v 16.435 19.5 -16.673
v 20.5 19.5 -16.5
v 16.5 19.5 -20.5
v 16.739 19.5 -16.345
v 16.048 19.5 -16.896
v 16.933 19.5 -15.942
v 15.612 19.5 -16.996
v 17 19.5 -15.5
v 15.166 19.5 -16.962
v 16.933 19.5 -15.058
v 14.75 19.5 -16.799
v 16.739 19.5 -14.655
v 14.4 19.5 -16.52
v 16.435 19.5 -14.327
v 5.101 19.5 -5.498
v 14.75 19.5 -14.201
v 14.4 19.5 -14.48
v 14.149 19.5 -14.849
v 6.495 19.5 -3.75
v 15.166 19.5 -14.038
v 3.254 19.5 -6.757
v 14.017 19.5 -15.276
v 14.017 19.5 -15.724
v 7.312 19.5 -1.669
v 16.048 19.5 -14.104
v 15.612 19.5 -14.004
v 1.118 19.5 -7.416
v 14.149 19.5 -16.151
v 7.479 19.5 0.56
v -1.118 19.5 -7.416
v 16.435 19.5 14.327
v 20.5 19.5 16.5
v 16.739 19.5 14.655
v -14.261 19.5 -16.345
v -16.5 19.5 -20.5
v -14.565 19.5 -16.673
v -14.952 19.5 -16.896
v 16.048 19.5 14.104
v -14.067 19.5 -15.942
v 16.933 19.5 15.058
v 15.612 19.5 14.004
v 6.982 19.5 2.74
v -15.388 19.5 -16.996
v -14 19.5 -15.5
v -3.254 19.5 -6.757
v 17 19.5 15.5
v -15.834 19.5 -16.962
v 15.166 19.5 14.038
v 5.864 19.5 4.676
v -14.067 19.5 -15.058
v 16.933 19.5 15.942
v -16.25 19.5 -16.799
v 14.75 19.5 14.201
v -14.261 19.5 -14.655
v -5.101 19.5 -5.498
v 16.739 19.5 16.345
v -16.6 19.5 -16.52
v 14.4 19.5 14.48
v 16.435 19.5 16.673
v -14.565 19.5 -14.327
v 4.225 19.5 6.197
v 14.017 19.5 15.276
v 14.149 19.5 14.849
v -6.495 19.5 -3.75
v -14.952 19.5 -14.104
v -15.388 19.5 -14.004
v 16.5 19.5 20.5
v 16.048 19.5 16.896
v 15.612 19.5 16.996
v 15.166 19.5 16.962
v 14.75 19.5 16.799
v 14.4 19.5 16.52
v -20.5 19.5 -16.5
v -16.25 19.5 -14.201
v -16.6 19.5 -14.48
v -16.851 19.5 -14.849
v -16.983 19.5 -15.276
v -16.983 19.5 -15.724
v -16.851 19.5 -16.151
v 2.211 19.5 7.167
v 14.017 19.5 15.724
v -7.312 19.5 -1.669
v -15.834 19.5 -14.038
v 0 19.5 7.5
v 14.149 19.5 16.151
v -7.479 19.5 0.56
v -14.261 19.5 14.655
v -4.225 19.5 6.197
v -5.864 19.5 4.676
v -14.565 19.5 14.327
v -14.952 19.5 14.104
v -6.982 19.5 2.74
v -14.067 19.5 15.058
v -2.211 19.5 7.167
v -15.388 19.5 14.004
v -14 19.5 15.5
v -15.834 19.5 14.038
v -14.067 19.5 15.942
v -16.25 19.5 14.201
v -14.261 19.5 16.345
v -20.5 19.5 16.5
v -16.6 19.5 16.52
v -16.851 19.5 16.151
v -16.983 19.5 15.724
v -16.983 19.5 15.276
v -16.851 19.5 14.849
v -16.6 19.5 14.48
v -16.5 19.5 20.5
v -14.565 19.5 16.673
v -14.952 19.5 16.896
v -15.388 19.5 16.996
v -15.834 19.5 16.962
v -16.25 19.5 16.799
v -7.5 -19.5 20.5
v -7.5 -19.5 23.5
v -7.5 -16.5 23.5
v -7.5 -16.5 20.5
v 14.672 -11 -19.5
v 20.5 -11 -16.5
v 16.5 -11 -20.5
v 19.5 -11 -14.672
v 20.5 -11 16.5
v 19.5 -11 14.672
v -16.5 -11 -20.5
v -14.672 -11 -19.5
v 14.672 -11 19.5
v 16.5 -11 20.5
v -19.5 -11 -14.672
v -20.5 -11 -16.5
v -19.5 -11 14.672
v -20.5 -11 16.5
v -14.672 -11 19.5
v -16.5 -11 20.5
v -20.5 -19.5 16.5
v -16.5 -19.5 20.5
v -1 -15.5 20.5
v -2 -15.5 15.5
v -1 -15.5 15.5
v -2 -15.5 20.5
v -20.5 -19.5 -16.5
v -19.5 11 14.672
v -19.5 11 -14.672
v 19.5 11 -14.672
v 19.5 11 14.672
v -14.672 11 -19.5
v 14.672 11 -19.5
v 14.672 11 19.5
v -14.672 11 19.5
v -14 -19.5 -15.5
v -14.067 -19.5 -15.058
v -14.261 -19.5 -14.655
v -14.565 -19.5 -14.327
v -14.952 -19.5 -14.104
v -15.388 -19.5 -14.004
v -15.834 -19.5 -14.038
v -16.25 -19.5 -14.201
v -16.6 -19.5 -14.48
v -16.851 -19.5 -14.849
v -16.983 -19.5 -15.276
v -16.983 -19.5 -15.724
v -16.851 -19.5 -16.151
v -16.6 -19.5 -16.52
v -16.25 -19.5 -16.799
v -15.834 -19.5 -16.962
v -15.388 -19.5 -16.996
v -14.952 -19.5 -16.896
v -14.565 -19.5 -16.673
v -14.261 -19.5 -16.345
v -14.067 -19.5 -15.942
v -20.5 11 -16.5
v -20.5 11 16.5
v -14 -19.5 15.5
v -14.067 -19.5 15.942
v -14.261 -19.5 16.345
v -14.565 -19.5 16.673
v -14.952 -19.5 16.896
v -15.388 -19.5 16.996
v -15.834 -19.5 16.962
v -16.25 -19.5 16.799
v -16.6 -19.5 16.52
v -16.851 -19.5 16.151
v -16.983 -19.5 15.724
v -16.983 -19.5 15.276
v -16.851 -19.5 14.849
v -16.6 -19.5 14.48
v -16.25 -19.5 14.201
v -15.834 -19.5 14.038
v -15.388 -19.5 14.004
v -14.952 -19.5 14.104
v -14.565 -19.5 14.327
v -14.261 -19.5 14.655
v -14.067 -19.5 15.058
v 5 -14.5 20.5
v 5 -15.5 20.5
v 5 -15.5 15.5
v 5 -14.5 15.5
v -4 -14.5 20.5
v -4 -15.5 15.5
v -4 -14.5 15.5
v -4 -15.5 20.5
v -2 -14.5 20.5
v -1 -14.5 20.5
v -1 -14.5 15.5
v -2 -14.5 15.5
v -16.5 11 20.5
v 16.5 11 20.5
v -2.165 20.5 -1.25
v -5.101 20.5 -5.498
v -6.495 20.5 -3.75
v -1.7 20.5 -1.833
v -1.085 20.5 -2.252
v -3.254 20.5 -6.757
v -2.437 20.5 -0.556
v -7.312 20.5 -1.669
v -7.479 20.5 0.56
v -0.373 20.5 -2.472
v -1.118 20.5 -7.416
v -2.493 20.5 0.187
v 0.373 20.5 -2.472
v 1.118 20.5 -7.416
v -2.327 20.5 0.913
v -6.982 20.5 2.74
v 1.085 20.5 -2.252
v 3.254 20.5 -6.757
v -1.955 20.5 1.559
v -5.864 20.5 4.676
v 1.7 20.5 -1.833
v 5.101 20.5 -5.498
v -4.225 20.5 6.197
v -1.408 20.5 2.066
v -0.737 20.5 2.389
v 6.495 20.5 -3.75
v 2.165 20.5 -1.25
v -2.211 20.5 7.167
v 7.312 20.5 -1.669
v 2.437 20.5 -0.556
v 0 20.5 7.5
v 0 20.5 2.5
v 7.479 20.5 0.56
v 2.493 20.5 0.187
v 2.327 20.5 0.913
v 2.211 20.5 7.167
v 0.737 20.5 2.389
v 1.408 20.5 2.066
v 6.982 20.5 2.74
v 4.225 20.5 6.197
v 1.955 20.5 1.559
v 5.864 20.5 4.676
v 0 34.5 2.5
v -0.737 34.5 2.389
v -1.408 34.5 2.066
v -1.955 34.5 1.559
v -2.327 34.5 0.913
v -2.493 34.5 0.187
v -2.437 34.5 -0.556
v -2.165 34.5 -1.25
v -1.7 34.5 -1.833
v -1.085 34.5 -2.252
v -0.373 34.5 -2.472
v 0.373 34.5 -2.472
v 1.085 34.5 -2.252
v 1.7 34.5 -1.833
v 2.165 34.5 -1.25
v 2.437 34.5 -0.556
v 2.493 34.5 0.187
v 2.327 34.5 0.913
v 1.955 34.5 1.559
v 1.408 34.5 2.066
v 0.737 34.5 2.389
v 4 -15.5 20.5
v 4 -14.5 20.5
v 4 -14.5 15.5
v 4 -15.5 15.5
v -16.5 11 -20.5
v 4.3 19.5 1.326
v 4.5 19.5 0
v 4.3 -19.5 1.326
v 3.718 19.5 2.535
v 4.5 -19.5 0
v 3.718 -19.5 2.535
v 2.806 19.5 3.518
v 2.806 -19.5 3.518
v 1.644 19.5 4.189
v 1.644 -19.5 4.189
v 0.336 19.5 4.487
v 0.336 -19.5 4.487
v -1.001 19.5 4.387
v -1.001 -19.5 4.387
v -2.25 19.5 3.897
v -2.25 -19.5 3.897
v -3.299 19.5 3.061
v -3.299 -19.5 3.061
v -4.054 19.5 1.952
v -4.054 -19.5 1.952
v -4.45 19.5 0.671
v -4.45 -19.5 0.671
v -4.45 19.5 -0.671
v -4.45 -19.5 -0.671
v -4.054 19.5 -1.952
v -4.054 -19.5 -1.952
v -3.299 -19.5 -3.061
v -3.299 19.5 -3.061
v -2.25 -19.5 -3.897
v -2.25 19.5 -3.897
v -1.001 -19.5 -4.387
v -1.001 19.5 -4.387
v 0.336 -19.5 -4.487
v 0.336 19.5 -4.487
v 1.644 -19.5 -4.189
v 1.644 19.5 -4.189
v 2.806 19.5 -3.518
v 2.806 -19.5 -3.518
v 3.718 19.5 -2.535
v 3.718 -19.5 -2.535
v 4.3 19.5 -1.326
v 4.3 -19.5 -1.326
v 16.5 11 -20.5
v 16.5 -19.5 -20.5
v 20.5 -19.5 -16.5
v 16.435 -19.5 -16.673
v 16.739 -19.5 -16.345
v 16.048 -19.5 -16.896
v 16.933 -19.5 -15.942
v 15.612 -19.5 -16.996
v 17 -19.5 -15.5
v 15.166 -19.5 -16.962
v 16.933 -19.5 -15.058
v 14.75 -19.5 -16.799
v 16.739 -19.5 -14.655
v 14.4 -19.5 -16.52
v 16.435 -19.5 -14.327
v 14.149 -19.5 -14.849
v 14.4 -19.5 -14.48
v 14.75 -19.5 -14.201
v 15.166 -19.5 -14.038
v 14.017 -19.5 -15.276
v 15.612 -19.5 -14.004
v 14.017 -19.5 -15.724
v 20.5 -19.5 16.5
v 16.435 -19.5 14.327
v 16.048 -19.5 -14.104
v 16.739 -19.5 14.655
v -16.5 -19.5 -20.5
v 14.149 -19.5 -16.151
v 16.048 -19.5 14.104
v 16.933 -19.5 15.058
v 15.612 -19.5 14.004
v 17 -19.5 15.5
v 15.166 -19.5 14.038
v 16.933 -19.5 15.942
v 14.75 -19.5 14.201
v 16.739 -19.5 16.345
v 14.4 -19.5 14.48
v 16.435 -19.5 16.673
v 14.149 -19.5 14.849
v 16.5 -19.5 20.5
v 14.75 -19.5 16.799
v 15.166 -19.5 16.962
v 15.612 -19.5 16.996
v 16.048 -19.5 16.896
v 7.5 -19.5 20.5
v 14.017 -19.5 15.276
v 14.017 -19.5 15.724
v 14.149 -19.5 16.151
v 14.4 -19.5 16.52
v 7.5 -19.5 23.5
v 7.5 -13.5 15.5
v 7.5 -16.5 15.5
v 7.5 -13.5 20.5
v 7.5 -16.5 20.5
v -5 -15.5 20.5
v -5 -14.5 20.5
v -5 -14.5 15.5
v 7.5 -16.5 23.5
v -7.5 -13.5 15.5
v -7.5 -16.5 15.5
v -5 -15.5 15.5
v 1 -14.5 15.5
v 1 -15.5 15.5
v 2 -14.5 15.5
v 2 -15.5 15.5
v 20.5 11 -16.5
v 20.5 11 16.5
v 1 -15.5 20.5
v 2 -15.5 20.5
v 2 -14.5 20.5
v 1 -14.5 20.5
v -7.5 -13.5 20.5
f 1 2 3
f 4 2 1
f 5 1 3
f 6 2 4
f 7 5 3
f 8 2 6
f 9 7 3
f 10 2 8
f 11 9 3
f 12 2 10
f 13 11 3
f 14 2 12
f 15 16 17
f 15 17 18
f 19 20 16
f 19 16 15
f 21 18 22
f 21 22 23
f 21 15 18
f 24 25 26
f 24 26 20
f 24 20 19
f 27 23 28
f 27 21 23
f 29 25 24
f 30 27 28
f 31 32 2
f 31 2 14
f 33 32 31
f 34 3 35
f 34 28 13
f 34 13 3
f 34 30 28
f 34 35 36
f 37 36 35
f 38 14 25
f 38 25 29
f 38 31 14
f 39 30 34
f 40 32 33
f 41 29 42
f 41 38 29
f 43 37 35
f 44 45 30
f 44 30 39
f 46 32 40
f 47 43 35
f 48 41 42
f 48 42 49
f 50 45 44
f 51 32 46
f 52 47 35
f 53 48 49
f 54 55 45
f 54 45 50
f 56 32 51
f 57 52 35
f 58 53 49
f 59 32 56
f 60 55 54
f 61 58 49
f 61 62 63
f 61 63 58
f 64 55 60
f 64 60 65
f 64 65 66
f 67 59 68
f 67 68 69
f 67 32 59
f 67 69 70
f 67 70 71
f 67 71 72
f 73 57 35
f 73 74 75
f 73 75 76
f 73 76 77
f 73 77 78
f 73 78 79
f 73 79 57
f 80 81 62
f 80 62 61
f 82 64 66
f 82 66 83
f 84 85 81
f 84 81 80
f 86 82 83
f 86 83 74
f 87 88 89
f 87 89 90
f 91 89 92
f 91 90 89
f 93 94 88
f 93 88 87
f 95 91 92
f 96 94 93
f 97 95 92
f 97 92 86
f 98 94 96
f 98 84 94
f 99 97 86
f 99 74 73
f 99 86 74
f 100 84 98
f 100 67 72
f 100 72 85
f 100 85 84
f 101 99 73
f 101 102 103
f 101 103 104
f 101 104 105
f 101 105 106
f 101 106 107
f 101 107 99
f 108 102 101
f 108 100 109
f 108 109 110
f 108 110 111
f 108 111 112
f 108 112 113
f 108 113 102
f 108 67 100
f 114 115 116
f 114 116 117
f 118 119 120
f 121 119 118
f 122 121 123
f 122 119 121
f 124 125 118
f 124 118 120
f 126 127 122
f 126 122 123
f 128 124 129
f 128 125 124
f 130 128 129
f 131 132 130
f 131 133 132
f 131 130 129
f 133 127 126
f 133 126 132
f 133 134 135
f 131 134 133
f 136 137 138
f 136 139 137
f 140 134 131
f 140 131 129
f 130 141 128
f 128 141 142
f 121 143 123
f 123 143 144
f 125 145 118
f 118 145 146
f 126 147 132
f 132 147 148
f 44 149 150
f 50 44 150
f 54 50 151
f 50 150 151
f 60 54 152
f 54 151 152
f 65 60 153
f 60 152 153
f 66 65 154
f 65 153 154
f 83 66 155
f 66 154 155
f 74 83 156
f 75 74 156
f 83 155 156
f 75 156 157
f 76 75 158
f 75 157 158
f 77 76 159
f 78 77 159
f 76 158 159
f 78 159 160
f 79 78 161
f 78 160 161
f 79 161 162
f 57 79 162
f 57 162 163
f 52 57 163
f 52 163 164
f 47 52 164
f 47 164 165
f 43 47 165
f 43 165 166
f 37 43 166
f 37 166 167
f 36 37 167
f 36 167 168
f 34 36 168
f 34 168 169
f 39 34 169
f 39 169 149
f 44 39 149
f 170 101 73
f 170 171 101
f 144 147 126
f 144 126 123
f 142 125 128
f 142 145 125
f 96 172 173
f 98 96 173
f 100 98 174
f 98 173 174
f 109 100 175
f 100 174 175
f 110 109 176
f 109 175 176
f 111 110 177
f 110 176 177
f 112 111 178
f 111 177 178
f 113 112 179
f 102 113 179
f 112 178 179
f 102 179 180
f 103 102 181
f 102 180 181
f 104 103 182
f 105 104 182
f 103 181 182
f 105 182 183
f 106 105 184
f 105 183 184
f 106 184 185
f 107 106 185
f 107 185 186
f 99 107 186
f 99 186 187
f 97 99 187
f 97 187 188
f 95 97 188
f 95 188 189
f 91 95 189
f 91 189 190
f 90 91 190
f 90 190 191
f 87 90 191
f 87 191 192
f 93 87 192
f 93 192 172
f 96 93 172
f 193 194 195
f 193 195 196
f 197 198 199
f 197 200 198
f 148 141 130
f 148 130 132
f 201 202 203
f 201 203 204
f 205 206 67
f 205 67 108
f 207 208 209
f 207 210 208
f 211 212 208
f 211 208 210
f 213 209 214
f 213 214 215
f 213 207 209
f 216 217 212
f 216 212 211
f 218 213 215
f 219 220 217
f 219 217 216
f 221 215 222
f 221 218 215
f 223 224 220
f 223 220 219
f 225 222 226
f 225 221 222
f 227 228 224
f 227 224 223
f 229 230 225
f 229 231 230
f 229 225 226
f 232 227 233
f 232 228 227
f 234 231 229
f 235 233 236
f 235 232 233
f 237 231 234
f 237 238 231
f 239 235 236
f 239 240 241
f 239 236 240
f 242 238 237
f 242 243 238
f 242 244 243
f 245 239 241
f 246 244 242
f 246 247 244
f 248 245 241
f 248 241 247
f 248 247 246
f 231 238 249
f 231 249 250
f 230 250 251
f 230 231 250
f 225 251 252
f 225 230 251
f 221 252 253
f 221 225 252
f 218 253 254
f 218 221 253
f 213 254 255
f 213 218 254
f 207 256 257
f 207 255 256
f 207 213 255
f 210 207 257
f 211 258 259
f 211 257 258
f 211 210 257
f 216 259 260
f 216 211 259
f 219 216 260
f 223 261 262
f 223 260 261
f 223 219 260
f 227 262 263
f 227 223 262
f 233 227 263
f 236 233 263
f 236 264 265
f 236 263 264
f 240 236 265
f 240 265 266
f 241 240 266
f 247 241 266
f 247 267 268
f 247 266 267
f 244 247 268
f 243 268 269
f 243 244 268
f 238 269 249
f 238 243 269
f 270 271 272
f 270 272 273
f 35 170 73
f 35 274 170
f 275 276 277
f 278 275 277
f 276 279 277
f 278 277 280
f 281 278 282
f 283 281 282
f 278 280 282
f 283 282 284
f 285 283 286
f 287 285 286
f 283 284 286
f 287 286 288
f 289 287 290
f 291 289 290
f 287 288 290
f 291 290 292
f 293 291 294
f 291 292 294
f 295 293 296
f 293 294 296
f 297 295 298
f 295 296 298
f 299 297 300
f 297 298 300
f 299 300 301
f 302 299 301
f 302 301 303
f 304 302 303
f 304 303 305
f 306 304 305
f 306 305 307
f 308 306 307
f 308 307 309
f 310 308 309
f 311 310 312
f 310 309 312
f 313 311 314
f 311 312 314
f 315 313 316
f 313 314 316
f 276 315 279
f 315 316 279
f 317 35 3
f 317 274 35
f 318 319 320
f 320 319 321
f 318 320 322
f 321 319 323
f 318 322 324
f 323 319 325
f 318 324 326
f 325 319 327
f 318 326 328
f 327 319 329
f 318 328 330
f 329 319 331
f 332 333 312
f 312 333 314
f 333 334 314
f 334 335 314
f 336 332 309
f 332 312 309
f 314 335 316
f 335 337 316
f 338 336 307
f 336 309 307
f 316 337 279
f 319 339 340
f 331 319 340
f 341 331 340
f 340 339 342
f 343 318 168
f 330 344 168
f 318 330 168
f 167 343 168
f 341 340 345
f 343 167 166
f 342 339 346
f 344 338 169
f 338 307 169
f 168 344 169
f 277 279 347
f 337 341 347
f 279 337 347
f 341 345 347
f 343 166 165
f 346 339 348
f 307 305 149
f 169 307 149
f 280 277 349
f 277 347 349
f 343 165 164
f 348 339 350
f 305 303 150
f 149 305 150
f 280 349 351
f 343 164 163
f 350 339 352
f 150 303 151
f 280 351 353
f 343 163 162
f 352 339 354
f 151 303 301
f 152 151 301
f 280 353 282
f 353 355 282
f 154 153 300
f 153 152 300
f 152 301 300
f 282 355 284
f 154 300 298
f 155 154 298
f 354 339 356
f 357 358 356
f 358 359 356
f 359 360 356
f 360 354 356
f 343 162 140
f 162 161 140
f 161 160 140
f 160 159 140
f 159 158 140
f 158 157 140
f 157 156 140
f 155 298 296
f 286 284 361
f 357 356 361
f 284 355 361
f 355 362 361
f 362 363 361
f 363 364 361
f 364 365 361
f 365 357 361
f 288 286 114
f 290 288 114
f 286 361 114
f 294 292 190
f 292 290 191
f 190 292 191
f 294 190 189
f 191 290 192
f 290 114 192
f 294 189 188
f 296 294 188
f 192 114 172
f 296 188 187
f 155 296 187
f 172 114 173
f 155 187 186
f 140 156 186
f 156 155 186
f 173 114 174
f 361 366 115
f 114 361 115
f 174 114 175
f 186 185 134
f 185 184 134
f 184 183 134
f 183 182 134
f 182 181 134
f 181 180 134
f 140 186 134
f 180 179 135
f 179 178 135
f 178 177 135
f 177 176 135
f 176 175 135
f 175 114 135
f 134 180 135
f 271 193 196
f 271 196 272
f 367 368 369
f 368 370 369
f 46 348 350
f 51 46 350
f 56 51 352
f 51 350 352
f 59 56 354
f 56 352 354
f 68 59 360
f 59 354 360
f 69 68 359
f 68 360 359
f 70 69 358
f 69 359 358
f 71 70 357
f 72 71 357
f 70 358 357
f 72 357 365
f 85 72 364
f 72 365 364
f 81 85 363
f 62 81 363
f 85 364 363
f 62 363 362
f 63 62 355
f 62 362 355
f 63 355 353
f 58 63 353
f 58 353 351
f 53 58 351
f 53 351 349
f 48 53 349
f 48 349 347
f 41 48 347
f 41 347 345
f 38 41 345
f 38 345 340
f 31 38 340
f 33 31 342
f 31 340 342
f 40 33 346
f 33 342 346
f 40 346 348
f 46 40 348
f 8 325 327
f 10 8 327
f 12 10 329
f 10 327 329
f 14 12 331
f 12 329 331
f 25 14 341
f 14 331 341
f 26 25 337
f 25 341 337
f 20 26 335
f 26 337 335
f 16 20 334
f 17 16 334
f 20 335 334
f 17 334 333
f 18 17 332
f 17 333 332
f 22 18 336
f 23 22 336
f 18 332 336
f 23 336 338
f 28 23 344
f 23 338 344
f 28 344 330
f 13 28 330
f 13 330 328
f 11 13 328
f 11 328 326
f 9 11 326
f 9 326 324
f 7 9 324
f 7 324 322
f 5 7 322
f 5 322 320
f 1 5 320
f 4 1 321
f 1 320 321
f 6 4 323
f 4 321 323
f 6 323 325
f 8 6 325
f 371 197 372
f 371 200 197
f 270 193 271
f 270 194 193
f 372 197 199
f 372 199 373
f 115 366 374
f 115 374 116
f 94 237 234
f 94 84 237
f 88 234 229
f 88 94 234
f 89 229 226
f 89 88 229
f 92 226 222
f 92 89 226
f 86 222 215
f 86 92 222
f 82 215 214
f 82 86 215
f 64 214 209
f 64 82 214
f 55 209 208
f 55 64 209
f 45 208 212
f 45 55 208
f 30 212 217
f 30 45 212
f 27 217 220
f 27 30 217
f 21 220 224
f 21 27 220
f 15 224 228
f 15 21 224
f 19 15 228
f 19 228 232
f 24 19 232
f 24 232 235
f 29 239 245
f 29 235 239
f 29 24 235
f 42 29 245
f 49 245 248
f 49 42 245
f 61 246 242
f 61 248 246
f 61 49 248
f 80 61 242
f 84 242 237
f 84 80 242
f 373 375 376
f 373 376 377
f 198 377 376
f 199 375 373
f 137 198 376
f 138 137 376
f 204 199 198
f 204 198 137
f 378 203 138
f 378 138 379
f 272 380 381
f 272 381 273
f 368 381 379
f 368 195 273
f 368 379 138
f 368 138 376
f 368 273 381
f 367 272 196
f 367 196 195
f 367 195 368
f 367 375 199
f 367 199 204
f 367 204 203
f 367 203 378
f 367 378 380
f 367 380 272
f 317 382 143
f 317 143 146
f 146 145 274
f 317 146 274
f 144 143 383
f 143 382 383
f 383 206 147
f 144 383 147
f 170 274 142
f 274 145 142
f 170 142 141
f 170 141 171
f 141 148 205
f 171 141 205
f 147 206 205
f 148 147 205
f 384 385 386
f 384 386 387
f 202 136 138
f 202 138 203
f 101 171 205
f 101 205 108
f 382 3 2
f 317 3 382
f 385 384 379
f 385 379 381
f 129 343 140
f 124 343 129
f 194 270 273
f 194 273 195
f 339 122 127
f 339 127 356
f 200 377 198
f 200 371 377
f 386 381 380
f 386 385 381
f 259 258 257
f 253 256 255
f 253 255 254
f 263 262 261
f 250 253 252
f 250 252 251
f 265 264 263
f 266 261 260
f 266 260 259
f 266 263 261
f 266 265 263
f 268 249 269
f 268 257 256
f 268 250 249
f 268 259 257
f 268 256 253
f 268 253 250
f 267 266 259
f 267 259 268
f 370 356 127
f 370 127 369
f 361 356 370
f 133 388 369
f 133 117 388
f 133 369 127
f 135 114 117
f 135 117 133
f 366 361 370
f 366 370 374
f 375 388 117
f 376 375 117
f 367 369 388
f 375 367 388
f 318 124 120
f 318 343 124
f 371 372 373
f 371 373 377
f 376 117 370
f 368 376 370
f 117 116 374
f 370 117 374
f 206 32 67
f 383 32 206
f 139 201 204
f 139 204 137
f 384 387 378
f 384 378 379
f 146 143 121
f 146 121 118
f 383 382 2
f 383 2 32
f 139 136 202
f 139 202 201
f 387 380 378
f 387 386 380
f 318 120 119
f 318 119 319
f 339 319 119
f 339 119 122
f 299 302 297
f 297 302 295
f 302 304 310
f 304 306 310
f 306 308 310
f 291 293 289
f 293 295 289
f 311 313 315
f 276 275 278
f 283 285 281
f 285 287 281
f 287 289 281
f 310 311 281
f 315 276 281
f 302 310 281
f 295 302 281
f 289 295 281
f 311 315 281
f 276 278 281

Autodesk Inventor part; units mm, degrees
ref_plane "YZ Plane" through (0, 0, 0) normal (1, 0, 0) x (0, 1, 0)
ref_plane "XZ Plane" through (0, 0, 0) normal (0, 1, 0) x (-1, 0, 0)
ref_plane "XY Plane" through (0, 0, 0) normal (0, 0, 1) x (1, 0, 0)
sketch "Skizze1" plane through (0, 0, 0) normal (0, 1, 0) x (-1, 0, 0)
  line L0 (-20.5, 20.5) -> (20.5, 20.5)
  line L1 (20.5, 20.5) -> (20.5, -20.5)
  line L2 (20.5, -20.5) -> (-20.5, -20.5)
  line L3 (-20.5, -20.5) -> (-20.5, 20.5)
  line L4 (-20.5, 20.5) -> (20.5, -20.5) construction
  line L5 (20.5, 20.5) -> (-20.5, -20.5) construction
  point P0 (0, 0)
  dimension "d0" = 41
  dimension "d1" = 41
extrude "Extrusion1" add sketch "Skizze1" along normal mid plane 39
sketch "Skizze2" plane through (0, -19.5, 0) normal (0, -1, 0) x (1, 0, 0)
  line L0 (-20.5, 20.5) -> (20.5, 20.5) projected
  line L1 (-7.5, 20.5) -> (7.5, 20.5)
  line L2 (7.5, 20.5) -> (7.5, 23.5)
  line L3 (7.5, 23.5) -> (-7.5, 23.5)
  line L4 (-7.5, 23.5) -> (-7.5, 20.5)
  line L5 (0, -29.3) -> (0, 32.3) projected
  point P0 (0, 0)
  dimension "d4" = 15
  dimension "d5" = 3
extrude "Extrusion2" add sketch "Skizze2" against normal blind 3
sketch "Skizze3" plane through (0, -19.5, 0) normal (0, -1, 0) x (1, 0, 0)
  line L0 (-15.5, -15.5) -> (15.5, -15.5)
  line L1 (15.5, -15.5) -> (15.5, 15.5)
  line L2 (15.5, 15.5) -> (-15.5, 15.5)
  line L3 (-15.5, 15.5) -> (-15.5, -15.5)
  line L4 (-15.5, -15.5) -> (15.5, 15.5) construction
  line L5 (15.5, -15.5) -> (-15.5, 15.5) construction
  circle A0 centre (-15.5, 15.5) radius 1.5
  circle A1 centre (15.5, 15.5) radius 1.5
  circle A2 centre (15.5, -15.5) radius 1.5
  circle A3 centre (-15.5, -15.5) radius 1.5
  circle A4 centre (0, 0) radius 4.5
  dimension "d8" = 31
  dimension "d9" = 31
  dimension "d10" = 3
  dimension "d11" = 9
extrude "Extrusion3" cut sketch "Skizze3" along normal through all both and the other way through all contours L3 A3 L0 | L0 A3 L3 | A2 L1 L0 | L0 L1 A2 | A0 L2 L3 | L3 L2 A0 | A1 L2 L1 | L1 L2 A1 | A4
chamfer "Fase1" distance 4 angle 45 4 edges at (20.5, 0, 20.5) (-20.5, 0, 20.5) (20.5, 0, -20.5) (-20.5, 0, -20.5)
sketch "Skizze4" plane through (0, 0, 0) normal (0, 1, 0) x (-1, 0, 0)
  line L0 (19.5, 14.6716) -> (14.6716, 19.5)
  line L1 (-14.6716, 19.5) -> (-19.5, 14.6716)
  line L2 (-19.5, -14.6716) -> (-14.6716, -19.5)
  line L3 (14.6716, -19.5) -> (19.5, -14.6716)
  line L4 (25.5, -25.5) -> (-25.5, -25.5)
  line L5 (-25.5, -25.5) -> (-25.5, 25.5)
  line L6 (-25.5, 25.5) -> (25.5, 25.5)
  line L7 (25.5, 25.5) -> (25.5, -25.5)
  line L8 (25.5, -25.5) -> (-25.5, 25.5) construction
  line L9 (-25.5, -25.5) -> (25.5, 25.5) construction
  line L10 (-20.5, 16.5) -> (-16.5, 20.5) projected
  line L11 (-16.5, -20.5) -> (-20.5, -16.5) projected
  line L12 (20.5, -16.5) -> (16.5, -20.5) projected
  line L13 (16.5, 20.5) -> (20.5, 16.5) projected
  line L14 (19.5, 14.6716) -> (19.5, -14.6716)
  line L15 (14.6716, -19.5) -> (-14.6716, -19.5)
  line L16 (-19.5, -14.6716) -> (-19.5, 14.6716)
  line L17 (-14.6716, 19.5) -> (14.6716, 19.5)
  line L18 (16.5, 20.5) -> (-16.5, 20.5) projected
  line L19 (-20.5, 16.5) -> (-20.5, -16.5) projected
  line L20 (-16.5, -20.5) -> (16.5, -20.5) projected
  line L21 (20.5, -16.5) -> (20.5, 16.5) projected
  point P0 (0, 0)
  dimension "d21" = 2
  dimension "d22" = 1
  dimension "d24" = 1
  dimension "d25" = 1
extrude "Extrusion4" cut sketch "Skizze4" along normal mid plane 22 contours L4 L5 L6 L7 | L10 L18 L13 L21 L12 L20 L11 L19
sketch "Skizze6" plane through (-7.5, -16.5, 20.5) normal (0, 0, 1) x (1, 0, 0)
  line L0 (0, 0) -> (15, 0)
  line L1 (15, 0) -> (15, 3)
  line L2 (15, 3) -> (0, 3)
  line L3 (0, 3) -> (0, 0)
  line L4 (15, -3) -> (15, 0) projected
  line L5 (0, -3) -> (0, 0) projected
  line L6 (0, 0) -> (15, 0) projected
  line L7 (2.5, 1) -> (3.5, 1)
  line L8 (3.5, 1) -> (3.5, 2)
  line L9 (3.5, 2) -> (2.5, 2)
  line L10 (2.5, 2) -> (2.5, 1)
  line L11 (2.5, 1) -> (3.5, 2) construction
  line L12 (3.5, 1) -> (2.5, 2) construction
  line L13 (5.5, 1) -> (6.5, 1)
  line L14 (6.5, 1) -> (6.5, 2)
  line L15 (6.5, 2) -> (5.5, 2)
  line L16 (5.5, 2) -> (5.5, 1)
  line L17 (5.5, 1) -> (6.5, 2) construction
  line L18 (6.5, 1) -> (5.5, 2) construction
  line L19 (8.5, 1) -> (9.5, 1)
  line L20 (9.5, 1) -> (9.5, 2)
  line L21 (9.5, 2) -> (8.5, 2)
  line L22 (8.5, 2) -> (8.5, 1)
  line L23 (8.5, 1) -> (9.5, 2) construction
  line L24 (9.5, 1) -> (8.5, 2) construction
  line L25 (11.5, 1) -> (12.5, 1)
  line L26 (12.5, 1) -> (12.5, 2)
  line L27 (12.5, 2) -> (11.5, 2)
  line L28 (11.5, 2) -> (11.5, 1)
  line L29 (11.5, 1) -> (12.5, 2) construction
  line L30 (12.5, 1) -> (11.5, 2) construction
  line L31 (7.5, -10.8) -> (7.5, 43.8) projected
  point P0 (7.5, 16.5)
  point P1 (3, 1.5)
  point P2 (6, 1.5)
  point P3 (9, 1.5)
  point P4 (12, 1.5)
  point P5 (12, 1.5)
  point P6 (15, 1.5)
  dimension "d29" = 3
  dimension "d30" = 3
  dimension "d31" = 3
  dimension "d32" = 1
  dimension "d33" = 1
extrude "Extrusion6" cut sketch "Skizze6" against normal blind 5
sketch "Skizze7" plane through (0, 0, 0) normal (1, 0, 0) x (0, 1, 0)
  line L0 (34.5, 0) -> (34.5, 2.5)
  line L1 (34.5, 2.5) -> (20.5, 2.5)
  line L2 (20.5, 2.5) -> (20.5, 7.5)
  line L3 (20.5, 7.5) -> (19.5, 7.5)
  line L4 (19.5, -16.5) -> (19.5, 16.5) projected
  line L5 (19.5, 0) -> (34.5, 0)
  line L6 (19.5, 0) -> (19.5, 7.5)
  line L7 (38.5419, 0) -> (33.7383, 0)
  point P0 (0, 0)
  dimension "d37" = 5
  dimension "d38" = 1
  dimension "d39" = 15
  dimension "d40" = 15
revolve "Umdrehung1" add sketch "Skizze7" angle 360 about axis through (0, 19.5, 0) along (0, 1, 0)
equation "\"d24\" = d22"
equation "\"d25\" = d22"
equation "\"d31\" = d30"
equation "\"d33\" = d32"
properties part number "MotorBlock"
